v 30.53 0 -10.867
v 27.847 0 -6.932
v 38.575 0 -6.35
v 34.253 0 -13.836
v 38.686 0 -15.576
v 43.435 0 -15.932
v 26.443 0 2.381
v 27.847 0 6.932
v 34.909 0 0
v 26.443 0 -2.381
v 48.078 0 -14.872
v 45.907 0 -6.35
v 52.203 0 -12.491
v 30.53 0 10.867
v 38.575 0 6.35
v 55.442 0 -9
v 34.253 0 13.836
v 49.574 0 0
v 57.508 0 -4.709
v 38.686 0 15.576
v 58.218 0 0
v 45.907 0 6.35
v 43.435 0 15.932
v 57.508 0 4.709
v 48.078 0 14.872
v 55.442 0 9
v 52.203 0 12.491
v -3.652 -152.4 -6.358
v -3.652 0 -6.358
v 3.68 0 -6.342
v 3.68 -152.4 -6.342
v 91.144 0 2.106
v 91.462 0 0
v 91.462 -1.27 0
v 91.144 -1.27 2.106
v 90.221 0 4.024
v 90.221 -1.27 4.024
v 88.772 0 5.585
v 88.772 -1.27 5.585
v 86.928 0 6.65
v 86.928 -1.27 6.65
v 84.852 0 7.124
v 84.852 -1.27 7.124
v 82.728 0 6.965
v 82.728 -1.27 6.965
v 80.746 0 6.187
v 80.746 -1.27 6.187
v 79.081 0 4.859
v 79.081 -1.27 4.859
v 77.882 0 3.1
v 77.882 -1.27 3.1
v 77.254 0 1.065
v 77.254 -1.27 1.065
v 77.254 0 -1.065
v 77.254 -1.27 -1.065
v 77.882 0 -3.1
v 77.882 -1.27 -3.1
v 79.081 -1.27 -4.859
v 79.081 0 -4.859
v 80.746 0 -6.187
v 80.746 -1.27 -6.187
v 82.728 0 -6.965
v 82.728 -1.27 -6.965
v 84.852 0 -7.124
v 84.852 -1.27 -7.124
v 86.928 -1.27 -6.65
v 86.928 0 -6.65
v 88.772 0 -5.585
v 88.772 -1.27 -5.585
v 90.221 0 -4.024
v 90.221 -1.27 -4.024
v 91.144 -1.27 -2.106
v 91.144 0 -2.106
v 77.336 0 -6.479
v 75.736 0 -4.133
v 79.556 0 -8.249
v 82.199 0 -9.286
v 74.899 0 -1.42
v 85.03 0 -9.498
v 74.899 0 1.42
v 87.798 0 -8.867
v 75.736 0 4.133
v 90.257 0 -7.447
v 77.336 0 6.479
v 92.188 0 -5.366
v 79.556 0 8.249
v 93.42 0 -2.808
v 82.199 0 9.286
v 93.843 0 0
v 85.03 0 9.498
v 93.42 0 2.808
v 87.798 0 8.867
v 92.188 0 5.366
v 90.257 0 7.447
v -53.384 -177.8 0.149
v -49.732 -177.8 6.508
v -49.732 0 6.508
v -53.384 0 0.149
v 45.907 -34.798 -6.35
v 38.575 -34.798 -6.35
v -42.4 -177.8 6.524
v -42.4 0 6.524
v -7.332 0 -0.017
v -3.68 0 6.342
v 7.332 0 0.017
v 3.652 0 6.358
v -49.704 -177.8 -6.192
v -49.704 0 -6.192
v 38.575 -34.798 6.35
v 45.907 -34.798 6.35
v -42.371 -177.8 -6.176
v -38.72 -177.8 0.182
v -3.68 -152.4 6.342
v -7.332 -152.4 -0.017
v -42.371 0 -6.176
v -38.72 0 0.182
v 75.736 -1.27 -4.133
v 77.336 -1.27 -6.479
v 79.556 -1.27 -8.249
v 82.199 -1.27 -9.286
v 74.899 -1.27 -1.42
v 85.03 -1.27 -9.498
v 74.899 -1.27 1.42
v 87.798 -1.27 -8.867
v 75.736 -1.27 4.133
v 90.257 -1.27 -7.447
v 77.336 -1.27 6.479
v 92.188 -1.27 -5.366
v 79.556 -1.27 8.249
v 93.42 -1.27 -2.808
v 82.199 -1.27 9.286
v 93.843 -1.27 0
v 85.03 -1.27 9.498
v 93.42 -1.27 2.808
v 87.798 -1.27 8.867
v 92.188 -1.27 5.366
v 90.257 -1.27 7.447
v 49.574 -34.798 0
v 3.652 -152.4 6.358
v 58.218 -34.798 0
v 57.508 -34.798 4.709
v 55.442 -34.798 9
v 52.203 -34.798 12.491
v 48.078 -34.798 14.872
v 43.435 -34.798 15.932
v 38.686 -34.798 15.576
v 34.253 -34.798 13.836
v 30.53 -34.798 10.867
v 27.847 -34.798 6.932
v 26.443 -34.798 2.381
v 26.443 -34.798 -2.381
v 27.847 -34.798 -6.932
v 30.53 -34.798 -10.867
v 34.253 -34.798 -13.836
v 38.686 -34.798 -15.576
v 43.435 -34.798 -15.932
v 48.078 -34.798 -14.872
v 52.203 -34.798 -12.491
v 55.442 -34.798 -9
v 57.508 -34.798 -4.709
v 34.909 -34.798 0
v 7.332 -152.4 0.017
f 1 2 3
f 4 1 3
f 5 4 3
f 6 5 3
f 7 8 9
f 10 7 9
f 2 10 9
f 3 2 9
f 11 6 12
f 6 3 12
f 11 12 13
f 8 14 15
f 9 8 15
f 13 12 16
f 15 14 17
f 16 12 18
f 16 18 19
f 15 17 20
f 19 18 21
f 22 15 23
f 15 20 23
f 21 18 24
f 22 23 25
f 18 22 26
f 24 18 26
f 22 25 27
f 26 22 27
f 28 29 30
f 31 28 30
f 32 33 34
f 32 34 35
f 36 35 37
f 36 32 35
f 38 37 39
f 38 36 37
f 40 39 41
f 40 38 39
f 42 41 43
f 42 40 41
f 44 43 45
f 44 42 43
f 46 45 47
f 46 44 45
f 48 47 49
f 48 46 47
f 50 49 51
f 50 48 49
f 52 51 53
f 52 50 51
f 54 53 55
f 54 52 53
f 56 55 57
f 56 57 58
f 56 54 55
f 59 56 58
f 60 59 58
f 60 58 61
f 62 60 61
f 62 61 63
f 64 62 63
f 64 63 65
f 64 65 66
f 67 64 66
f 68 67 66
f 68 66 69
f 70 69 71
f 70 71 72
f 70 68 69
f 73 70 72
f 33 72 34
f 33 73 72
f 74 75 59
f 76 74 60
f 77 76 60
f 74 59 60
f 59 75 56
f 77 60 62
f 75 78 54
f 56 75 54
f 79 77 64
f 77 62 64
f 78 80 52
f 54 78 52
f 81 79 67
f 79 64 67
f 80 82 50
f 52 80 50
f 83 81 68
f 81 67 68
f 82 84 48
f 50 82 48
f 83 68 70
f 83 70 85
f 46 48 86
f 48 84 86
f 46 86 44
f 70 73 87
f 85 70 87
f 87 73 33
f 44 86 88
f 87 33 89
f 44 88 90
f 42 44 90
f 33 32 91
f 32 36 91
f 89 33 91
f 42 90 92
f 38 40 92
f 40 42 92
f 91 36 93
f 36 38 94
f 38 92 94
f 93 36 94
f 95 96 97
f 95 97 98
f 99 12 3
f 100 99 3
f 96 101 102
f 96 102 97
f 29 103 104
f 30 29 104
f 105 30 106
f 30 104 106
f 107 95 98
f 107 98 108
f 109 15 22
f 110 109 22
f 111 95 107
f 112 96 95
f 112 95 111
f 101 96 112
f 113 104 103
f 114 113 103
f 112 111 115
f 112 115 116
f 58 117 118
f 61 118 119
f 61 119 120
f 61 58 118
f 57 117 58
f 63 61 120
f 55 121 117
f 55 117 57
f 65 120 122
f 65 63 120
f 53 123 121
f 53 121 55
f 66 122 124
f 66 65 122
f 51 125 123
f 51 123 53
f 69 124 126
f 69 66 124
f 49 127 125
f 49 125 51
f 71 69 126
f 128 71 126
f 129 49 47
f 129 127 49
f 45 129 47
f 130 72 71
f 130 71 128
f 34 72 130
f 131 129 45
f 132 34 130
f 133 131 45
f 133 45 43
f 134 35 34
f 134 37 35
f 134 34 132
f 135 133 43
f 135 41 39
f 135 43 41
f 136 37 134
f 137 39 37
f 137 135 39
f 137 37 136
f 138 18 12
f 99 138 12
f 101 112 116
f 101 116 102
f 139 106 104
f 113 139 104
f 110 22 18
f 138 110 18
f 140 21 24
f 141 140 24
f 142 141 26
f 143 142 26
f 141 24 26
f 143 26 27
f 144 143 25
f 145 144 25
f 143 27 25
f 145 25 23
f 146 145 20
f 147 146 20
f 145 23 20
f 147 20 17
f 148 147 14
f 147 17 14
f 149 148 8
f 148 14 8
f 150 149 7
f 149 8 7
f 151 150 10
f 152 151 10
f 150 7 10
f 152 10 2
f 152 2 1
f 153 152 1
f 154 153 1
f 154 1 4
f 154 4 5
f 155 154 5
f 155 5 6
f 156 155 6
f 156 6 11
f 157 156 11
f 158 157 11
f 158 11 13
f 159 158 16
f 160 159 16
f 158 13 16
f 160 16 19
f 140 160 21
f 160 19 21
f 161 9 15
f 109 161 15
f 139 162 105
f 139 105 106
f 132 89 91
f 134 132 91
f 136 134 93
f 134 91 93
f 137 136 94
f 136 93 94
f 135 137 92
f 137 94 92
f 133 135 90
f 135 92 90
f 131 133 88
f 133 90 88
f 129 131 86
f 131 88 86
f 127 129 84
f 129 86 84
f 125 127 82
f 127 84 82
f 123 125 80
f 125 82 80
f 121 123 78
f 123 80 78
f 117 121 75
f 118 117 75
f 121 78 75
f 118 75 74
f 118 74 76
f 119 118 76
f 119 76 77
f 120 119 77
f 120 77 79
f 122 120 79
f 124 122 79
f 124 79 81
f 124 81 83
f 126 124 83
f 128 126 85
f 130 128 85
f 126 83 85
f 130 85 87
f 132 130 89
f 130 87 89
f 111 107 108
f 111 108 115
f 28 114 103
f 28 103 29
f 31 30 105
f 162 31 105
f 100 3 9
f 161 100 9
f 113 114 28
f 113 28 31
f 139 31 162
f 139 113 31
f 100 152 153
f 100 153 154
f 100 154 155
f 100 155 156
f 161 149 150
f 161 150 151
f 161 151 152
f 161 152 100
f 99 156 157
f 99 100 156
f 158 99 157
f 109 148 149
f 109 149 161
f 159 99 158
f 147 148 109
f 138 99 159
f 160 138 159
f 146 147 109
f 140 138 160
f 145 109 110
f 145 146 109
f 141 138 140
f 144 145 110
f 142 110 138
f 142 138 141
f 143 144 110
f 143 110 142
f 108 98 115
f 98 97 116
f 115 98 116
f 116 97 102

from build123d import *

# Parameters (mm, degrees)
F1_DEPTH = 152.4
F2_DEPTH = 177.8
F3_R     = 15.9766
F4_DEPTH = 34.798
F5_R     = 9.525
F5_R_2   = 7.14375
F6_DEPTH = 1.27


with BuildPart() as f1:
    # F0 (on Front) → F1 (new body)
    with BuildSketch(Plane.XZ):
        Polygon((7.33233, 0.016514), (3.651863, 6.358241), (-3.680466, 6.341727), (-7.33233, -0.016514), (-3.651863, -6.358241), (3.680466, -6.341727), align=None)
    extrude(amount=F1_DEPTH)


with BuildPart() as f2:
    # F0 (on Front) → F2 (new body)
    with BuildSketch(Plane.XZ):
        Polygon((-38.719516, 0.182337), (-42.399982, 6.524064), (-49.732312, 6.50755), (-53.384175, 0.149309), (-49.703709, -6.192418), (-42.371379, -6.175904), align=None)
    extrude(amount=F2_DEPTH)


with BuildPart() as f4:
    # F3 (on Front) → F4 (new body)
    with BuildSketch(Plane.XZ):
        with Locations((42.241306, 0)):
            Circle(F3_R)
        Polygon((34.908957, 0), (38.575132, 6.35), (45.90748, 6.35), (49.573654, 0), (45.90748, -6.35), (38.575132, -6.35), align=None, mode=Mode.SUBTRACT)
    extrude(amount=F4_DEPTH)


with BuildPart() as f6:
    # F5 (on Front) → F6 (new body)
    with BuildSketch(Plane.XZ):
        with Locations((84.318109, 0)):
            Circle(F5_R)
        with Locations((84.318109, 0)):
            Circle(F5_R_2, mode=Mode.SUBTRACT)
    extrude(amount=F6_DEPTH)


solid = Compound([f1.part, f2.part, f4.part, f6.part])
